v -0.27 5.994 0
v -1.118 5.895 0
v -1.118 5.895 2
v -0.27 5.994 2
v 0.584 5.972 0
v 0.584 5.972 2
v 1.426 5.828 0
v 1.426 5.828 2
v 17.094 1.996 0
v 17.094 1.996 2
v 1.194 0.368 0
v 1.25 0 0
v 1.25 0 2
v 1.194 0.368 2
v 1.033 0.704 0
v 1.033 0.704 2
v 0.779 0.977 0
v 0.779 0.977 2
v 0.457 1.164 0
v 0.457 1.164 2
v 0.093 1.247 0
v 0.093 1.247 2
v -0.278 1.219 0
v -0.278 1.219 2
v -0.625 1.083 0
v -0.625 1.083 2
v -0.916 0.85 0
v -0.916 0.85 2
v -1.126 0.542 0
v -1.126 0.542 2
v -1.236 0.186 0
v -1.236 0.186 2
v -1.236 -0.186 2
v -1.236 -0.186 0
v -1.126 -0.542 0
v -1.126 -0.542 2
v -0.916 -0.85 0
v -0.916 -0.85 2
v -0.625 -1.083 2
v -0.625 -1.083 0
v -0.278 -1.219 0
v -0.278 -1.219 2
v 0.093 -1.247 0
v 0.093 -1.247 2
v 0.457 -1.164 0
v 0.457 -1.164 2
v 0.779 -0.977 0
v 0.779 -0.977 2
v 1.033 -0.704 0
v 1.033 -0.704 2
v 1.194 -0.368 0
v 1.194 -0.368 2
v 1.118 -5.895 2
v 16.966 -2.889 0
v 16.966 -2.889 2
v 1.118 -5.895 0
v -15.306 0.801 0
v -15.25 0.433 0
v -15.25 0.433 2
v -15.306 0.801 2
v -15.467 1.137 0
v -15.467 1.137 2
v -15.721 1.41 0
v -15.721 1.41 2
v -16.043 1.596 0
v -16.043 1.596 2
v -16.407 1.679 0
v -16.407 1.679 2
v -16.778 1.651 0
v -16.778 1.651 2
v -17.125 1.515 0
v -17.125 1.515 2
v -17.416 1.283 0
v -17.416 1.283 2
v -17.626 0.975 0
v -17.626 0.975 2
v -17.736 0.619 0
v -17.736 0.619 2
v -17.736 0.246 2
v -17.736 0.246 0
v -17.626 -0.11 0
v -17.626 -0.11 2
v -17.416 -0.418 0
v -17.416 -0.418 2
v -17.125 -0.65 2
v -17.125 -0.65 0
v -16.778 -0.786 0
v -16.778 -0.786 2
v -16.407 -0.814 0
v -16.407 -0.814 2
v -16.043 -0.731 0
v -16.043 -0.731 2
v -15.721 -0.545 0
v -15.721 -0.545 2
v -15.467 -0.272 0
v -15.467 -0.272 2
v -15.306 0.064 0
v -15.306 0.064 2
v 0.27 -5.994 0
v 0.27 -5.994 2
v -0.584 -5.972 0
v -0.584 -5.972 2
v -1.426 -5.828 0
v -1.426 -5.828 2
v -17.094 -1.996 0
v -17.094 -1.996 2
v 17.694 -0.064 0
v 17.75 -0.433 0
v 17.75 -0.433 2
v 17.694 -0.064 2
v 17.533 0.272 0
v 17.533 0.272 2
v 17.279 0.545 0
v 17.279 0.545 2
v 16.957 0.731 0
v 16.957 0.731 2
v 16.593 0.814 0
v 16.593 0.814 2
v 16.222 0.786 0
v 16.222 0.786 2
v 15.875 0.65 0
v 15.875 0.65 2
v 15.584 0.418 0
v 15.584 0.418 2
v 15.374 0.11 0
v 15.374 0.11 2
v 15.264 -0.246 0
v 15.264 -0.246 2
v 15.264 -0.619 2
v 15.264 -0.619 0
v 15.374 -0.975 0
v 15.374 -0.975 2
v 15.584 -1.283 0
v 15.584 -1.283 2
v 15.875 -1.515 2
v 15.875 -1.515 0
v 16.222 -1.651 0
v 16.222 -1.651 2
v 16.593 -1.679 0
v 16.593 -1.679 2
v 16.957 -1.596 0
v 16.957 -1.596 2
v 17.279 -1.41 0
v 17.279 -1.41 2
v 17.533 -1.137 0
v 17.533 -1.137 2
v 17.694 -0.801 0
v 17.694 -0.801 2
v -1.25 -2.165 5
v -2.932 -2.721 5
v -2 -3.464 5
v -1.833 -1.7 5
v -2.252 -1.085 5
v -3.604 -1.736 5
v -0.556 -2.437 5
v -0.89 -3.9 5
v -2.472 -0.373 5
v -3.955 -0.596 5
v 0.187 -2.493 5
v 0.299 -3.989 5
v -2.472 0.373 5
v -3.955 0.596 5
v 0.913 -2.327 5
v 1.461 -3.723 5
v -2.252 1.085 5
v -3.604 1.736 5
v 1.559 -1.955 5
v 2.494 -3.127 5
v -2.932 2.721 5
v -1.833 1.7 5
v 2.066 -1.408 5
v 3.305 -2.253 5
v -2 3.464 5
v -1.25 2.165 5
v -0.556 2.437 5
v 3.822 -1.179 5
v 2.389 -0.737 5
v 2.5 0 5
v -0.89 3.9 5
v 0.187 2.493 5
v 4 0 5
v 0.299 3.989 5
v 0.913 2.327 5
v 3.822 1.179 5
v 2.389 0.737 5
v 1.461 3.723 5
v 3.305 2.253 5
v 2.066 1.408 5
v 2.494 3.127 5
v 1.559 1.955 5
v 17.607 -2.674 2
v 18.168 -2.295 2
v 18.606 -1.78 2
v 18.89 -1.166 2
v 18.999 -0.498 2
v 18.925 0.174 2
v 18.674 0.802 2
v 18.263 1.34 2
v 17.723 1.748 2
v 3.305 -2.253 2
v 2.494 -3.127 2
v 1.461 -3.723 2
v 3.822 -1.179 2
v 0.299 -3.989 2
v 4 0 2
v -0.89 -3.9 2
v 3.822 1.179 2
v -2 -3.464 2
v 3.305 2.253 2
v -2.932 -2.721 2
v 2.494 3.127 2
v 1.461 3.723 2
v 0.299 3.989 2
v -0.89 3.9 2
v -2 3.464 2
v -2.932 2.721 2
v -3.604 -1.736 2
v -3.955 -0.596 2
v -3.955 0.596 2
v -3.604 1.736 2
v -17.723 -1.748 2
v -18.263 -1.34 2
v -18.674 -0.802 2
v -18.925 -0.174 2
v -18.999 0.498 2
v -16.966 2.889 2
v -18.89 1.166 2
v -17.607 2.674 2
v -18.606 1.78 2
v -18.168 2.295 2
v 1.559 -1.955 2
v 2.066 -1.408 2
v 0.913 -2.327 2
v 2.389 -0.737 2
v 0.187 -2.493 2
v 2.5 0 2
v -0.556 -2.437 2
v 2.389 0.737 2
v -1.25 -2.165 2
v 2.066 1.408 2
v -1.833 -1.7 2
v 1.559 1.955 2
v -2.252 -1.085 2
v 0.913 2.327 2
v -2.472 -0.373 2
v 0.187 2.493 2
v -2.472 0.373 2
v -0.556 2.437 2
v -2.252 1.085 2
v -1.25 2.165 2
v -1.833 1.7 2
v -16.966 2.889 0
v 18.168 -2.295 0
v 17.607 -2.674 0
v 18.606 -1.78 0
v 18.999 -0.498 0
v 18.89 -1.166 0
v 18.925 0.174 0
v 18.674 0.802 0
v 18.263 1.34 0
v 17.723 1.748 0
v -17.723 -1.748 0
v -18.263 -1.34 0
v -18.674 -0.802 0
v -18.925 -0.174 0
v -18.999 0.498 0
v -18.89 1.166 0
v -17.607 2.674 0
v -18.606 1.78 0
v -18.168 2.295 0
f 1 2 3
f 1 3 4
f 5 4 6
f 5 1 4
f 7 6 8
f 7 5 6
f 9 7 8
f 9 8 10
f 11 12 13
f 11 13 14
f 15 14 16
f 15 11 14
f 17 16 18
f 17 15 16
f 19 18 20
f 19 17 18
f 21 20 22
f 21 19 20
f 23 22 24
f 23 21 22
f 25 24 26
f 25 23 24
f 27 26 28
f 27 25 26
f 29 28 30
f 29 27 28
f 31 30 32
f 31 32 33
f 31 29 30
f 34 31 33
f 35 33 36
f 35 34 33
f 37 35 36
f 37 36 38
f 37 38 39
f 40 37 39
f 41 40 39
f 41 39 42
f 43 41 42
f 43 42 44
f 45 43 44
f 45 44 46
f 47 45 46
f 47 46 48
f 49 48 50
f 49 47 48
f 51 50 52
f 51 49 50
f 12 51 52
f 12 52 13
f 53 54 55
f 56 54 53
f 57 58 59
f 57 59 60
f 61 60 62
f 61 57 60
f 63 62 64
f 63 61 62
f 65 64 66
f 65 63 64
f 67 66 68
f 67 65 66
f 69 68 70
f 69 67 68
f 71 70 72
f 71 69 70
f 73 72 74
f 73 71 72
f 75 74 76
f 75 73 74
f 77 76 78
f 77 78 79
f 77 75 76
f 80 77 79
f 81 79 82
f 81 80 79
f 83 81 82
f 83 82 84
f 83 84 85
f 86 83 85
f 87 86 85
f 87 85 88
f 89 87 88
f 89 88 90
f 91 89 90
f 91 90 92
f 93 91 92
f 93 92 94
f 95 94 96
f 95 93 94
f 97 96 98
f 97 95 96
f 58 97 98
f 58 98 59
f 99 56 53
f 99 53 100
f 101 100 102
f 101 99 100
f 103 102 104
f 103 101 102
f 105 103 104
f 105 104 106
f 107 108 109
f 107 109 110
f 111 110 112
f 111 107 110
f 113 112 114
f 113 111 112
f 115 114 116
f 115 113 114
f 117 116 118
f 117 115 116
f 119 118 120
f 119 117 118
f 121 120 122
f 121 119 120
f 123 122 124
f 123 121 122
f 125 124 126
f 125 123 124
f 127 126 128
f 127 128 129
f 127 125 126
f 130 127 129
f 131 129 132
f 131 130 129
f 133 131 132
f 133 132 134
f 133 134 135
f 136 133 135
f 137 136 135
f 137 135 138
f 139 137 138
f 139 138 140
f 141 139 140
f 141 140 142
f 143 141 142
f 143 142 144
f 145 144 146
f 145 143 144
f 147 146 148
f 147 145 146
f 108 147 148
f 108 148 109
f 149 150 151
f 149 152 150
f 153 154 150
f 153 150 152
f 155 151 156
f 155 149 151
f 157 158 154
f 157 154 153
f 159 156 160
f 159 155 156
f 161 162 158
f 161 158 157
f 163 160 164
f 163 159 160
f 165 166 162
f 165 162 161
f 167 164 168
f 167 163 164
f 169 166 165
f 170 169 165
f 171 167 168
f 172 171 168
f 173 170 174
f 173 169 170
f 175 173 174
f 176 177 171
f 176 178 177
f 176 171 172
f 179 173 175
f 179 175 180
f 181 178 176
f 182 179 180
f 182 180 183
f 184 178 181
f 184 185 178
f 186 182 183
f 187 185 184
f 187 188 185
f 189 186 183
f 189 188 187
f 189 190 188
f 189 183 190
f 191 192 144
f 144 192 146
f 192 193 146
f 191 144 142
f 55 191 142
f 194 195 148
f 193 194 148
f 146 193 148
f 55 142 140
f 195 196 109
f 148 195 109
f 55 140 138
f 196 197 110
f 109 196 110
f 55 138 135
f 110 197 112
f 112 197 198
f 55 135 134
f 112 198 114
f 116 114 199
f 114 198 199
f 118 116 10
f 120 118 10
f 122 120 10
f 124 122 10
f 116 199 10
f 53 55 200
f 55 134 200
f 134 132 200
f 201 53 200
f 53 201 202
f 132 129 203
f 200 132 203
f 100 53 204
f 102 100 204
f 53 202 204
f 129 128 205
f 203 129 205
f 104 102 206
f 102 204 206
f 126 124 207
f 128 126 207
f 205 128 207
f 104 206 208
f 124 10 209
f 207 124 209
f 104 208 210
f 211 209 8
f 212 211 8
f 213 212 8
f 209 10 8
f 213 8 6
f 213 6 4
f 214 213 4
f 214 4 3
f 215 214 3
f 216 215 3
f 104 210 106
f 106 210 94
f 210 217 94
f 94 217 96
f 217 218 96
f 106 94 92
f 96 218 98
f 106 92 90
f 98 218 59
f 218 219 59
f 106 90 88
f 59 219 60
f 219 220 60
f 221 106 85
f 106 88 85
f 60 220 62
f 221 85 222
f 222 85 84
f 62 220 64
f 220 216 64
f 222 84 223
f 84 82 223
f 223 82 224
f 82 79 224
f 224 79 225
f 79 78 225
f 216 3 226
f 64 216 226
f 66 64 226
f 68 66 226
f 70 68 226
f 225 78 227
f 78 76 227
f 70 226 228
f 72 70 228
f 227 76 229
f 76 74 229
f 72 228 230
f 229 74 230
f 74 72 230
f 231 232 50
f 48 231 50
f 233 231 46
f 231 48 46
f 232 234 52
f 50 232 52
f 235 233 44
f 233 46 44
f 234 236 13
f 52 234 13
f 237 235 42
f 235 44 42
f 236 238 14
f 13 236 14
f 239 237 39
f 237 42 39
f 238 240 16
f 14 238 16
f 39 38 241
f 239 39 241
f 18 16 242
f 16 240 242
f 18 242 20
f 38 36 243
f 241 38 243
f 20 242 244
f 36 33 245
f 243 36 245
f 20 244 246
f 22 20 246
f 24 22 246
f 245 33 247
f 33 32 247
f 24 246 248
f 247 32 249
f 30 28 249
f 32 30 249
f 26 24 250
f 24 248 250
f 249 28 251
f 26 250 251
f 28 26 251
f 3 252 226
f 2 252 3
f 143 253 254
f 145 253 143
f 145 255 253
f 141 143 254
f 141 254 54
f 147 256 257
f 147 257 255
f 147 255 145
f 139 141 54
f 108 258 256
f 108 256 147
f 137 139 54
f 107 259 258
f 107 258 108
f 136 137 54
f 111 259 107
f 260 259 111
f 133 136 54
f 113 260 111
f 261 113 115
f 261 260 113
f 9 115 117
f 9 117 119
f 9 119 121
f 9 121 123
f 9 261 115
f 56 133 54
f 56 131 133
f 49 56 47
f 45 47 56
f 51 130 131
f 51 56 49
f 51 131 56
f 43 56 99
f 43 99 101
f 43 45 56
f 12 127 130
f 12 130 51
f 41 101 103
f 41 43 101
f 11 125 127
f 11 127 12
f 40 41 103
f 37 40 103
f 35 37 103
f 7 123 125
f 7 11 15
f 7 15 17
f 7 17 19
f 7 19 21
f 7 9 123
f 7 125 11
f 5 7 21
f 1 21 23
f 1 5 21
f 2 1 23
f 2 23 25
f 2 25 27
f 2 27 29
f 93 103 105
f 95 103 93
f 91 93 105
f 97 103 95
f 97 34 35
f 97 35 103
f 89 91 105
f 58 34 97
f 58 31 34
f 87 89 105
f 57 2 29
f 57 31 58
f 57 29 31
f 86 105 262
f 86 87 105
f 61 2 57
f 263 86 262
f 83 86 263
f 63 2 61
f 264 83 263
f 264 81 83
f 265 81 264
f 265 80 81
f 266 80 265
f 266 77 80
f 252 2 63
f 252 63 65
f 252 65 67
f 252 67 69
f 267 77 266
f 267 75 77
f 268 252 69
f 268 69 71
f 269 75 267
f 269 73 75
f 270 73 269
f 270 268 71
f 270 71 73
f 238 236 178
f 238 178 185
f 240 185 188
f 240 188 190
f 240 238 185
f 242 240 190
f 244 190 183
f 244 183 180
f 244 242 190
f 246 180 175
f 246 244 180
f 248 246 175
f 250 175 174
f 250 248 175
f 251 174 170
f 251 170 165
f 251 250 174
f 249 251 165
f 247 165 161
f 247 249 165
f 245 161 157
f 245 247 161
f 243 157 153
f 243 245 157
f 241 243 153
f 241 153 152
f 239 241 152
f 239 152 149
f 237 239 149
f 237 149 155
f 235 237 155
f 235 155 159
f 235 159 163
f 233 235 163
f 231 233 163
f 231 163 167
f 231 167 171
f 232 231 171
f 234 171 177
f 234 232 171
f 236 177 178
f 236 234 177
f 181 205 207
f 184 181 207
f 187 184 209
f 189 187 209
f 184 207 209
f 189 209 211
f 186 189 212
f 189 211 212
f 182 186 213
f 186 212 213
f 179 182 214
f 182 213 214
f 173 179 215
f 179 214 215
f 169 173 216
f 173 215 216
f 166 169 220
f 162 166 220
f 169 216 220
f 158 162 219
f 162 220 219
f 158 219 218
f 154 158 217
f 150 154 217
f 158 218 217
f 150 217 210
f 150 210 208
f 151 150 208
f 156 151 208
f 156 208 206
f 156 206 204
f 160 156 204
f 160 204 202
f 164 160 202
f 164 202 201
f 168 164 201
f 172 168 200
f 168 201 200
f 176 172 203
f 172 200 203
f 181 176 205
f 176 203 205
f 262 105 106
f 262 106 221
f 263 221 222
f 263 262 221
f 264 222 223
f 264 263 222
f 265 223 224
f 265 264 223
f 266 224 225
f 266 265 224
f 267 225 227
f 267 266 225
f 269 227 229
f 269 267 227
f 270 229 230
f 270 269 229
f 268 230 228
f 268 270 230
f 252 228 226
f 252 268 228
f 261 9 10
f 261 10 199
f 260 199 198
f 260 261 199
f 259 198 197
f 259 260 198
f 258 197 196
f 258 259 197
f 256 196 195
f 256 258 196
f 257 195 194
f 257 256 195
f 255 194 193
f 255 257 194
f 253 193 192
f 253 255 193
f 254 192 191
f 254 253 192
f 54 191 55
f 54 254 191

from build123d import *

# Parameters (mm, degrees)
SKETCH1_R           = 1.25
BOSS_EXTRUDE1_DEPTH = 2
SKETCH2_R           = 4
SKETCH2_R_2         = 2.5
BOSS_EXTRUDE2_DEPTH = 3


with BuildPart() as part:
    # Sketch1 → Boss-Extrude1 (new body)
    with BuildSketch(Plane.XY):
        with BuildLine():
            Line((-16.965907586, 2.88879085), (-1.118178206, 5.894885707))
            ThreePointArc((-1.118178206, 5.894885707), (0.157250865, 5.997938993), (1.425527907, 5.828196135))
            Line((1.425527907, 5.828196135), (17.093969961, 1.995826584))
            ThreePointArc((17.093969961, 1.995826584), (18.999141247, -0.498109666), (16.965907586, -2.88879085))
            Line((16.965907586, -2.88879085), (1.118178206, -5.894885707))
            ThreePointArc((1.118178206, -5.894885707), (-0.157250865, -5.997938993), (-1.425527907, -5.828196135))
            Line((-1.425527907, -5.828196135), (-17.093969961, -1.995826584))
            ThreePointArc((-17.093969961, -1.995826584), (-18.999141247, 0.498109666), (-16.965907586, 2.88879085))
        make_face()
        with Locations((-16.5, 0.432588472)):
            Circle(SKETCH1_R, mode=Mode.SUBTRACT)
        with Locations((16.5, -0.432588472)):
            Circle(SKETCH1_R, mode=Mode.SUBTRACT)
        Circle(SKETCH1_R, mode=Mode.SUBTRACT)
    extrude(amount=BOSS_EXTRUDE1_DEPTH)

    # Sketch2 → Boss-Extrude2 (add)
    with BuildSketch(Plane.XY.offset(2)):
        Circle(SKETCH2_R)
        Circle(SKETCH2_R_2, mode=Mode.SUBTRACT)
    extrude(amount=BOSS_EXTRUDE2_DEPTH)


solid = part.part
